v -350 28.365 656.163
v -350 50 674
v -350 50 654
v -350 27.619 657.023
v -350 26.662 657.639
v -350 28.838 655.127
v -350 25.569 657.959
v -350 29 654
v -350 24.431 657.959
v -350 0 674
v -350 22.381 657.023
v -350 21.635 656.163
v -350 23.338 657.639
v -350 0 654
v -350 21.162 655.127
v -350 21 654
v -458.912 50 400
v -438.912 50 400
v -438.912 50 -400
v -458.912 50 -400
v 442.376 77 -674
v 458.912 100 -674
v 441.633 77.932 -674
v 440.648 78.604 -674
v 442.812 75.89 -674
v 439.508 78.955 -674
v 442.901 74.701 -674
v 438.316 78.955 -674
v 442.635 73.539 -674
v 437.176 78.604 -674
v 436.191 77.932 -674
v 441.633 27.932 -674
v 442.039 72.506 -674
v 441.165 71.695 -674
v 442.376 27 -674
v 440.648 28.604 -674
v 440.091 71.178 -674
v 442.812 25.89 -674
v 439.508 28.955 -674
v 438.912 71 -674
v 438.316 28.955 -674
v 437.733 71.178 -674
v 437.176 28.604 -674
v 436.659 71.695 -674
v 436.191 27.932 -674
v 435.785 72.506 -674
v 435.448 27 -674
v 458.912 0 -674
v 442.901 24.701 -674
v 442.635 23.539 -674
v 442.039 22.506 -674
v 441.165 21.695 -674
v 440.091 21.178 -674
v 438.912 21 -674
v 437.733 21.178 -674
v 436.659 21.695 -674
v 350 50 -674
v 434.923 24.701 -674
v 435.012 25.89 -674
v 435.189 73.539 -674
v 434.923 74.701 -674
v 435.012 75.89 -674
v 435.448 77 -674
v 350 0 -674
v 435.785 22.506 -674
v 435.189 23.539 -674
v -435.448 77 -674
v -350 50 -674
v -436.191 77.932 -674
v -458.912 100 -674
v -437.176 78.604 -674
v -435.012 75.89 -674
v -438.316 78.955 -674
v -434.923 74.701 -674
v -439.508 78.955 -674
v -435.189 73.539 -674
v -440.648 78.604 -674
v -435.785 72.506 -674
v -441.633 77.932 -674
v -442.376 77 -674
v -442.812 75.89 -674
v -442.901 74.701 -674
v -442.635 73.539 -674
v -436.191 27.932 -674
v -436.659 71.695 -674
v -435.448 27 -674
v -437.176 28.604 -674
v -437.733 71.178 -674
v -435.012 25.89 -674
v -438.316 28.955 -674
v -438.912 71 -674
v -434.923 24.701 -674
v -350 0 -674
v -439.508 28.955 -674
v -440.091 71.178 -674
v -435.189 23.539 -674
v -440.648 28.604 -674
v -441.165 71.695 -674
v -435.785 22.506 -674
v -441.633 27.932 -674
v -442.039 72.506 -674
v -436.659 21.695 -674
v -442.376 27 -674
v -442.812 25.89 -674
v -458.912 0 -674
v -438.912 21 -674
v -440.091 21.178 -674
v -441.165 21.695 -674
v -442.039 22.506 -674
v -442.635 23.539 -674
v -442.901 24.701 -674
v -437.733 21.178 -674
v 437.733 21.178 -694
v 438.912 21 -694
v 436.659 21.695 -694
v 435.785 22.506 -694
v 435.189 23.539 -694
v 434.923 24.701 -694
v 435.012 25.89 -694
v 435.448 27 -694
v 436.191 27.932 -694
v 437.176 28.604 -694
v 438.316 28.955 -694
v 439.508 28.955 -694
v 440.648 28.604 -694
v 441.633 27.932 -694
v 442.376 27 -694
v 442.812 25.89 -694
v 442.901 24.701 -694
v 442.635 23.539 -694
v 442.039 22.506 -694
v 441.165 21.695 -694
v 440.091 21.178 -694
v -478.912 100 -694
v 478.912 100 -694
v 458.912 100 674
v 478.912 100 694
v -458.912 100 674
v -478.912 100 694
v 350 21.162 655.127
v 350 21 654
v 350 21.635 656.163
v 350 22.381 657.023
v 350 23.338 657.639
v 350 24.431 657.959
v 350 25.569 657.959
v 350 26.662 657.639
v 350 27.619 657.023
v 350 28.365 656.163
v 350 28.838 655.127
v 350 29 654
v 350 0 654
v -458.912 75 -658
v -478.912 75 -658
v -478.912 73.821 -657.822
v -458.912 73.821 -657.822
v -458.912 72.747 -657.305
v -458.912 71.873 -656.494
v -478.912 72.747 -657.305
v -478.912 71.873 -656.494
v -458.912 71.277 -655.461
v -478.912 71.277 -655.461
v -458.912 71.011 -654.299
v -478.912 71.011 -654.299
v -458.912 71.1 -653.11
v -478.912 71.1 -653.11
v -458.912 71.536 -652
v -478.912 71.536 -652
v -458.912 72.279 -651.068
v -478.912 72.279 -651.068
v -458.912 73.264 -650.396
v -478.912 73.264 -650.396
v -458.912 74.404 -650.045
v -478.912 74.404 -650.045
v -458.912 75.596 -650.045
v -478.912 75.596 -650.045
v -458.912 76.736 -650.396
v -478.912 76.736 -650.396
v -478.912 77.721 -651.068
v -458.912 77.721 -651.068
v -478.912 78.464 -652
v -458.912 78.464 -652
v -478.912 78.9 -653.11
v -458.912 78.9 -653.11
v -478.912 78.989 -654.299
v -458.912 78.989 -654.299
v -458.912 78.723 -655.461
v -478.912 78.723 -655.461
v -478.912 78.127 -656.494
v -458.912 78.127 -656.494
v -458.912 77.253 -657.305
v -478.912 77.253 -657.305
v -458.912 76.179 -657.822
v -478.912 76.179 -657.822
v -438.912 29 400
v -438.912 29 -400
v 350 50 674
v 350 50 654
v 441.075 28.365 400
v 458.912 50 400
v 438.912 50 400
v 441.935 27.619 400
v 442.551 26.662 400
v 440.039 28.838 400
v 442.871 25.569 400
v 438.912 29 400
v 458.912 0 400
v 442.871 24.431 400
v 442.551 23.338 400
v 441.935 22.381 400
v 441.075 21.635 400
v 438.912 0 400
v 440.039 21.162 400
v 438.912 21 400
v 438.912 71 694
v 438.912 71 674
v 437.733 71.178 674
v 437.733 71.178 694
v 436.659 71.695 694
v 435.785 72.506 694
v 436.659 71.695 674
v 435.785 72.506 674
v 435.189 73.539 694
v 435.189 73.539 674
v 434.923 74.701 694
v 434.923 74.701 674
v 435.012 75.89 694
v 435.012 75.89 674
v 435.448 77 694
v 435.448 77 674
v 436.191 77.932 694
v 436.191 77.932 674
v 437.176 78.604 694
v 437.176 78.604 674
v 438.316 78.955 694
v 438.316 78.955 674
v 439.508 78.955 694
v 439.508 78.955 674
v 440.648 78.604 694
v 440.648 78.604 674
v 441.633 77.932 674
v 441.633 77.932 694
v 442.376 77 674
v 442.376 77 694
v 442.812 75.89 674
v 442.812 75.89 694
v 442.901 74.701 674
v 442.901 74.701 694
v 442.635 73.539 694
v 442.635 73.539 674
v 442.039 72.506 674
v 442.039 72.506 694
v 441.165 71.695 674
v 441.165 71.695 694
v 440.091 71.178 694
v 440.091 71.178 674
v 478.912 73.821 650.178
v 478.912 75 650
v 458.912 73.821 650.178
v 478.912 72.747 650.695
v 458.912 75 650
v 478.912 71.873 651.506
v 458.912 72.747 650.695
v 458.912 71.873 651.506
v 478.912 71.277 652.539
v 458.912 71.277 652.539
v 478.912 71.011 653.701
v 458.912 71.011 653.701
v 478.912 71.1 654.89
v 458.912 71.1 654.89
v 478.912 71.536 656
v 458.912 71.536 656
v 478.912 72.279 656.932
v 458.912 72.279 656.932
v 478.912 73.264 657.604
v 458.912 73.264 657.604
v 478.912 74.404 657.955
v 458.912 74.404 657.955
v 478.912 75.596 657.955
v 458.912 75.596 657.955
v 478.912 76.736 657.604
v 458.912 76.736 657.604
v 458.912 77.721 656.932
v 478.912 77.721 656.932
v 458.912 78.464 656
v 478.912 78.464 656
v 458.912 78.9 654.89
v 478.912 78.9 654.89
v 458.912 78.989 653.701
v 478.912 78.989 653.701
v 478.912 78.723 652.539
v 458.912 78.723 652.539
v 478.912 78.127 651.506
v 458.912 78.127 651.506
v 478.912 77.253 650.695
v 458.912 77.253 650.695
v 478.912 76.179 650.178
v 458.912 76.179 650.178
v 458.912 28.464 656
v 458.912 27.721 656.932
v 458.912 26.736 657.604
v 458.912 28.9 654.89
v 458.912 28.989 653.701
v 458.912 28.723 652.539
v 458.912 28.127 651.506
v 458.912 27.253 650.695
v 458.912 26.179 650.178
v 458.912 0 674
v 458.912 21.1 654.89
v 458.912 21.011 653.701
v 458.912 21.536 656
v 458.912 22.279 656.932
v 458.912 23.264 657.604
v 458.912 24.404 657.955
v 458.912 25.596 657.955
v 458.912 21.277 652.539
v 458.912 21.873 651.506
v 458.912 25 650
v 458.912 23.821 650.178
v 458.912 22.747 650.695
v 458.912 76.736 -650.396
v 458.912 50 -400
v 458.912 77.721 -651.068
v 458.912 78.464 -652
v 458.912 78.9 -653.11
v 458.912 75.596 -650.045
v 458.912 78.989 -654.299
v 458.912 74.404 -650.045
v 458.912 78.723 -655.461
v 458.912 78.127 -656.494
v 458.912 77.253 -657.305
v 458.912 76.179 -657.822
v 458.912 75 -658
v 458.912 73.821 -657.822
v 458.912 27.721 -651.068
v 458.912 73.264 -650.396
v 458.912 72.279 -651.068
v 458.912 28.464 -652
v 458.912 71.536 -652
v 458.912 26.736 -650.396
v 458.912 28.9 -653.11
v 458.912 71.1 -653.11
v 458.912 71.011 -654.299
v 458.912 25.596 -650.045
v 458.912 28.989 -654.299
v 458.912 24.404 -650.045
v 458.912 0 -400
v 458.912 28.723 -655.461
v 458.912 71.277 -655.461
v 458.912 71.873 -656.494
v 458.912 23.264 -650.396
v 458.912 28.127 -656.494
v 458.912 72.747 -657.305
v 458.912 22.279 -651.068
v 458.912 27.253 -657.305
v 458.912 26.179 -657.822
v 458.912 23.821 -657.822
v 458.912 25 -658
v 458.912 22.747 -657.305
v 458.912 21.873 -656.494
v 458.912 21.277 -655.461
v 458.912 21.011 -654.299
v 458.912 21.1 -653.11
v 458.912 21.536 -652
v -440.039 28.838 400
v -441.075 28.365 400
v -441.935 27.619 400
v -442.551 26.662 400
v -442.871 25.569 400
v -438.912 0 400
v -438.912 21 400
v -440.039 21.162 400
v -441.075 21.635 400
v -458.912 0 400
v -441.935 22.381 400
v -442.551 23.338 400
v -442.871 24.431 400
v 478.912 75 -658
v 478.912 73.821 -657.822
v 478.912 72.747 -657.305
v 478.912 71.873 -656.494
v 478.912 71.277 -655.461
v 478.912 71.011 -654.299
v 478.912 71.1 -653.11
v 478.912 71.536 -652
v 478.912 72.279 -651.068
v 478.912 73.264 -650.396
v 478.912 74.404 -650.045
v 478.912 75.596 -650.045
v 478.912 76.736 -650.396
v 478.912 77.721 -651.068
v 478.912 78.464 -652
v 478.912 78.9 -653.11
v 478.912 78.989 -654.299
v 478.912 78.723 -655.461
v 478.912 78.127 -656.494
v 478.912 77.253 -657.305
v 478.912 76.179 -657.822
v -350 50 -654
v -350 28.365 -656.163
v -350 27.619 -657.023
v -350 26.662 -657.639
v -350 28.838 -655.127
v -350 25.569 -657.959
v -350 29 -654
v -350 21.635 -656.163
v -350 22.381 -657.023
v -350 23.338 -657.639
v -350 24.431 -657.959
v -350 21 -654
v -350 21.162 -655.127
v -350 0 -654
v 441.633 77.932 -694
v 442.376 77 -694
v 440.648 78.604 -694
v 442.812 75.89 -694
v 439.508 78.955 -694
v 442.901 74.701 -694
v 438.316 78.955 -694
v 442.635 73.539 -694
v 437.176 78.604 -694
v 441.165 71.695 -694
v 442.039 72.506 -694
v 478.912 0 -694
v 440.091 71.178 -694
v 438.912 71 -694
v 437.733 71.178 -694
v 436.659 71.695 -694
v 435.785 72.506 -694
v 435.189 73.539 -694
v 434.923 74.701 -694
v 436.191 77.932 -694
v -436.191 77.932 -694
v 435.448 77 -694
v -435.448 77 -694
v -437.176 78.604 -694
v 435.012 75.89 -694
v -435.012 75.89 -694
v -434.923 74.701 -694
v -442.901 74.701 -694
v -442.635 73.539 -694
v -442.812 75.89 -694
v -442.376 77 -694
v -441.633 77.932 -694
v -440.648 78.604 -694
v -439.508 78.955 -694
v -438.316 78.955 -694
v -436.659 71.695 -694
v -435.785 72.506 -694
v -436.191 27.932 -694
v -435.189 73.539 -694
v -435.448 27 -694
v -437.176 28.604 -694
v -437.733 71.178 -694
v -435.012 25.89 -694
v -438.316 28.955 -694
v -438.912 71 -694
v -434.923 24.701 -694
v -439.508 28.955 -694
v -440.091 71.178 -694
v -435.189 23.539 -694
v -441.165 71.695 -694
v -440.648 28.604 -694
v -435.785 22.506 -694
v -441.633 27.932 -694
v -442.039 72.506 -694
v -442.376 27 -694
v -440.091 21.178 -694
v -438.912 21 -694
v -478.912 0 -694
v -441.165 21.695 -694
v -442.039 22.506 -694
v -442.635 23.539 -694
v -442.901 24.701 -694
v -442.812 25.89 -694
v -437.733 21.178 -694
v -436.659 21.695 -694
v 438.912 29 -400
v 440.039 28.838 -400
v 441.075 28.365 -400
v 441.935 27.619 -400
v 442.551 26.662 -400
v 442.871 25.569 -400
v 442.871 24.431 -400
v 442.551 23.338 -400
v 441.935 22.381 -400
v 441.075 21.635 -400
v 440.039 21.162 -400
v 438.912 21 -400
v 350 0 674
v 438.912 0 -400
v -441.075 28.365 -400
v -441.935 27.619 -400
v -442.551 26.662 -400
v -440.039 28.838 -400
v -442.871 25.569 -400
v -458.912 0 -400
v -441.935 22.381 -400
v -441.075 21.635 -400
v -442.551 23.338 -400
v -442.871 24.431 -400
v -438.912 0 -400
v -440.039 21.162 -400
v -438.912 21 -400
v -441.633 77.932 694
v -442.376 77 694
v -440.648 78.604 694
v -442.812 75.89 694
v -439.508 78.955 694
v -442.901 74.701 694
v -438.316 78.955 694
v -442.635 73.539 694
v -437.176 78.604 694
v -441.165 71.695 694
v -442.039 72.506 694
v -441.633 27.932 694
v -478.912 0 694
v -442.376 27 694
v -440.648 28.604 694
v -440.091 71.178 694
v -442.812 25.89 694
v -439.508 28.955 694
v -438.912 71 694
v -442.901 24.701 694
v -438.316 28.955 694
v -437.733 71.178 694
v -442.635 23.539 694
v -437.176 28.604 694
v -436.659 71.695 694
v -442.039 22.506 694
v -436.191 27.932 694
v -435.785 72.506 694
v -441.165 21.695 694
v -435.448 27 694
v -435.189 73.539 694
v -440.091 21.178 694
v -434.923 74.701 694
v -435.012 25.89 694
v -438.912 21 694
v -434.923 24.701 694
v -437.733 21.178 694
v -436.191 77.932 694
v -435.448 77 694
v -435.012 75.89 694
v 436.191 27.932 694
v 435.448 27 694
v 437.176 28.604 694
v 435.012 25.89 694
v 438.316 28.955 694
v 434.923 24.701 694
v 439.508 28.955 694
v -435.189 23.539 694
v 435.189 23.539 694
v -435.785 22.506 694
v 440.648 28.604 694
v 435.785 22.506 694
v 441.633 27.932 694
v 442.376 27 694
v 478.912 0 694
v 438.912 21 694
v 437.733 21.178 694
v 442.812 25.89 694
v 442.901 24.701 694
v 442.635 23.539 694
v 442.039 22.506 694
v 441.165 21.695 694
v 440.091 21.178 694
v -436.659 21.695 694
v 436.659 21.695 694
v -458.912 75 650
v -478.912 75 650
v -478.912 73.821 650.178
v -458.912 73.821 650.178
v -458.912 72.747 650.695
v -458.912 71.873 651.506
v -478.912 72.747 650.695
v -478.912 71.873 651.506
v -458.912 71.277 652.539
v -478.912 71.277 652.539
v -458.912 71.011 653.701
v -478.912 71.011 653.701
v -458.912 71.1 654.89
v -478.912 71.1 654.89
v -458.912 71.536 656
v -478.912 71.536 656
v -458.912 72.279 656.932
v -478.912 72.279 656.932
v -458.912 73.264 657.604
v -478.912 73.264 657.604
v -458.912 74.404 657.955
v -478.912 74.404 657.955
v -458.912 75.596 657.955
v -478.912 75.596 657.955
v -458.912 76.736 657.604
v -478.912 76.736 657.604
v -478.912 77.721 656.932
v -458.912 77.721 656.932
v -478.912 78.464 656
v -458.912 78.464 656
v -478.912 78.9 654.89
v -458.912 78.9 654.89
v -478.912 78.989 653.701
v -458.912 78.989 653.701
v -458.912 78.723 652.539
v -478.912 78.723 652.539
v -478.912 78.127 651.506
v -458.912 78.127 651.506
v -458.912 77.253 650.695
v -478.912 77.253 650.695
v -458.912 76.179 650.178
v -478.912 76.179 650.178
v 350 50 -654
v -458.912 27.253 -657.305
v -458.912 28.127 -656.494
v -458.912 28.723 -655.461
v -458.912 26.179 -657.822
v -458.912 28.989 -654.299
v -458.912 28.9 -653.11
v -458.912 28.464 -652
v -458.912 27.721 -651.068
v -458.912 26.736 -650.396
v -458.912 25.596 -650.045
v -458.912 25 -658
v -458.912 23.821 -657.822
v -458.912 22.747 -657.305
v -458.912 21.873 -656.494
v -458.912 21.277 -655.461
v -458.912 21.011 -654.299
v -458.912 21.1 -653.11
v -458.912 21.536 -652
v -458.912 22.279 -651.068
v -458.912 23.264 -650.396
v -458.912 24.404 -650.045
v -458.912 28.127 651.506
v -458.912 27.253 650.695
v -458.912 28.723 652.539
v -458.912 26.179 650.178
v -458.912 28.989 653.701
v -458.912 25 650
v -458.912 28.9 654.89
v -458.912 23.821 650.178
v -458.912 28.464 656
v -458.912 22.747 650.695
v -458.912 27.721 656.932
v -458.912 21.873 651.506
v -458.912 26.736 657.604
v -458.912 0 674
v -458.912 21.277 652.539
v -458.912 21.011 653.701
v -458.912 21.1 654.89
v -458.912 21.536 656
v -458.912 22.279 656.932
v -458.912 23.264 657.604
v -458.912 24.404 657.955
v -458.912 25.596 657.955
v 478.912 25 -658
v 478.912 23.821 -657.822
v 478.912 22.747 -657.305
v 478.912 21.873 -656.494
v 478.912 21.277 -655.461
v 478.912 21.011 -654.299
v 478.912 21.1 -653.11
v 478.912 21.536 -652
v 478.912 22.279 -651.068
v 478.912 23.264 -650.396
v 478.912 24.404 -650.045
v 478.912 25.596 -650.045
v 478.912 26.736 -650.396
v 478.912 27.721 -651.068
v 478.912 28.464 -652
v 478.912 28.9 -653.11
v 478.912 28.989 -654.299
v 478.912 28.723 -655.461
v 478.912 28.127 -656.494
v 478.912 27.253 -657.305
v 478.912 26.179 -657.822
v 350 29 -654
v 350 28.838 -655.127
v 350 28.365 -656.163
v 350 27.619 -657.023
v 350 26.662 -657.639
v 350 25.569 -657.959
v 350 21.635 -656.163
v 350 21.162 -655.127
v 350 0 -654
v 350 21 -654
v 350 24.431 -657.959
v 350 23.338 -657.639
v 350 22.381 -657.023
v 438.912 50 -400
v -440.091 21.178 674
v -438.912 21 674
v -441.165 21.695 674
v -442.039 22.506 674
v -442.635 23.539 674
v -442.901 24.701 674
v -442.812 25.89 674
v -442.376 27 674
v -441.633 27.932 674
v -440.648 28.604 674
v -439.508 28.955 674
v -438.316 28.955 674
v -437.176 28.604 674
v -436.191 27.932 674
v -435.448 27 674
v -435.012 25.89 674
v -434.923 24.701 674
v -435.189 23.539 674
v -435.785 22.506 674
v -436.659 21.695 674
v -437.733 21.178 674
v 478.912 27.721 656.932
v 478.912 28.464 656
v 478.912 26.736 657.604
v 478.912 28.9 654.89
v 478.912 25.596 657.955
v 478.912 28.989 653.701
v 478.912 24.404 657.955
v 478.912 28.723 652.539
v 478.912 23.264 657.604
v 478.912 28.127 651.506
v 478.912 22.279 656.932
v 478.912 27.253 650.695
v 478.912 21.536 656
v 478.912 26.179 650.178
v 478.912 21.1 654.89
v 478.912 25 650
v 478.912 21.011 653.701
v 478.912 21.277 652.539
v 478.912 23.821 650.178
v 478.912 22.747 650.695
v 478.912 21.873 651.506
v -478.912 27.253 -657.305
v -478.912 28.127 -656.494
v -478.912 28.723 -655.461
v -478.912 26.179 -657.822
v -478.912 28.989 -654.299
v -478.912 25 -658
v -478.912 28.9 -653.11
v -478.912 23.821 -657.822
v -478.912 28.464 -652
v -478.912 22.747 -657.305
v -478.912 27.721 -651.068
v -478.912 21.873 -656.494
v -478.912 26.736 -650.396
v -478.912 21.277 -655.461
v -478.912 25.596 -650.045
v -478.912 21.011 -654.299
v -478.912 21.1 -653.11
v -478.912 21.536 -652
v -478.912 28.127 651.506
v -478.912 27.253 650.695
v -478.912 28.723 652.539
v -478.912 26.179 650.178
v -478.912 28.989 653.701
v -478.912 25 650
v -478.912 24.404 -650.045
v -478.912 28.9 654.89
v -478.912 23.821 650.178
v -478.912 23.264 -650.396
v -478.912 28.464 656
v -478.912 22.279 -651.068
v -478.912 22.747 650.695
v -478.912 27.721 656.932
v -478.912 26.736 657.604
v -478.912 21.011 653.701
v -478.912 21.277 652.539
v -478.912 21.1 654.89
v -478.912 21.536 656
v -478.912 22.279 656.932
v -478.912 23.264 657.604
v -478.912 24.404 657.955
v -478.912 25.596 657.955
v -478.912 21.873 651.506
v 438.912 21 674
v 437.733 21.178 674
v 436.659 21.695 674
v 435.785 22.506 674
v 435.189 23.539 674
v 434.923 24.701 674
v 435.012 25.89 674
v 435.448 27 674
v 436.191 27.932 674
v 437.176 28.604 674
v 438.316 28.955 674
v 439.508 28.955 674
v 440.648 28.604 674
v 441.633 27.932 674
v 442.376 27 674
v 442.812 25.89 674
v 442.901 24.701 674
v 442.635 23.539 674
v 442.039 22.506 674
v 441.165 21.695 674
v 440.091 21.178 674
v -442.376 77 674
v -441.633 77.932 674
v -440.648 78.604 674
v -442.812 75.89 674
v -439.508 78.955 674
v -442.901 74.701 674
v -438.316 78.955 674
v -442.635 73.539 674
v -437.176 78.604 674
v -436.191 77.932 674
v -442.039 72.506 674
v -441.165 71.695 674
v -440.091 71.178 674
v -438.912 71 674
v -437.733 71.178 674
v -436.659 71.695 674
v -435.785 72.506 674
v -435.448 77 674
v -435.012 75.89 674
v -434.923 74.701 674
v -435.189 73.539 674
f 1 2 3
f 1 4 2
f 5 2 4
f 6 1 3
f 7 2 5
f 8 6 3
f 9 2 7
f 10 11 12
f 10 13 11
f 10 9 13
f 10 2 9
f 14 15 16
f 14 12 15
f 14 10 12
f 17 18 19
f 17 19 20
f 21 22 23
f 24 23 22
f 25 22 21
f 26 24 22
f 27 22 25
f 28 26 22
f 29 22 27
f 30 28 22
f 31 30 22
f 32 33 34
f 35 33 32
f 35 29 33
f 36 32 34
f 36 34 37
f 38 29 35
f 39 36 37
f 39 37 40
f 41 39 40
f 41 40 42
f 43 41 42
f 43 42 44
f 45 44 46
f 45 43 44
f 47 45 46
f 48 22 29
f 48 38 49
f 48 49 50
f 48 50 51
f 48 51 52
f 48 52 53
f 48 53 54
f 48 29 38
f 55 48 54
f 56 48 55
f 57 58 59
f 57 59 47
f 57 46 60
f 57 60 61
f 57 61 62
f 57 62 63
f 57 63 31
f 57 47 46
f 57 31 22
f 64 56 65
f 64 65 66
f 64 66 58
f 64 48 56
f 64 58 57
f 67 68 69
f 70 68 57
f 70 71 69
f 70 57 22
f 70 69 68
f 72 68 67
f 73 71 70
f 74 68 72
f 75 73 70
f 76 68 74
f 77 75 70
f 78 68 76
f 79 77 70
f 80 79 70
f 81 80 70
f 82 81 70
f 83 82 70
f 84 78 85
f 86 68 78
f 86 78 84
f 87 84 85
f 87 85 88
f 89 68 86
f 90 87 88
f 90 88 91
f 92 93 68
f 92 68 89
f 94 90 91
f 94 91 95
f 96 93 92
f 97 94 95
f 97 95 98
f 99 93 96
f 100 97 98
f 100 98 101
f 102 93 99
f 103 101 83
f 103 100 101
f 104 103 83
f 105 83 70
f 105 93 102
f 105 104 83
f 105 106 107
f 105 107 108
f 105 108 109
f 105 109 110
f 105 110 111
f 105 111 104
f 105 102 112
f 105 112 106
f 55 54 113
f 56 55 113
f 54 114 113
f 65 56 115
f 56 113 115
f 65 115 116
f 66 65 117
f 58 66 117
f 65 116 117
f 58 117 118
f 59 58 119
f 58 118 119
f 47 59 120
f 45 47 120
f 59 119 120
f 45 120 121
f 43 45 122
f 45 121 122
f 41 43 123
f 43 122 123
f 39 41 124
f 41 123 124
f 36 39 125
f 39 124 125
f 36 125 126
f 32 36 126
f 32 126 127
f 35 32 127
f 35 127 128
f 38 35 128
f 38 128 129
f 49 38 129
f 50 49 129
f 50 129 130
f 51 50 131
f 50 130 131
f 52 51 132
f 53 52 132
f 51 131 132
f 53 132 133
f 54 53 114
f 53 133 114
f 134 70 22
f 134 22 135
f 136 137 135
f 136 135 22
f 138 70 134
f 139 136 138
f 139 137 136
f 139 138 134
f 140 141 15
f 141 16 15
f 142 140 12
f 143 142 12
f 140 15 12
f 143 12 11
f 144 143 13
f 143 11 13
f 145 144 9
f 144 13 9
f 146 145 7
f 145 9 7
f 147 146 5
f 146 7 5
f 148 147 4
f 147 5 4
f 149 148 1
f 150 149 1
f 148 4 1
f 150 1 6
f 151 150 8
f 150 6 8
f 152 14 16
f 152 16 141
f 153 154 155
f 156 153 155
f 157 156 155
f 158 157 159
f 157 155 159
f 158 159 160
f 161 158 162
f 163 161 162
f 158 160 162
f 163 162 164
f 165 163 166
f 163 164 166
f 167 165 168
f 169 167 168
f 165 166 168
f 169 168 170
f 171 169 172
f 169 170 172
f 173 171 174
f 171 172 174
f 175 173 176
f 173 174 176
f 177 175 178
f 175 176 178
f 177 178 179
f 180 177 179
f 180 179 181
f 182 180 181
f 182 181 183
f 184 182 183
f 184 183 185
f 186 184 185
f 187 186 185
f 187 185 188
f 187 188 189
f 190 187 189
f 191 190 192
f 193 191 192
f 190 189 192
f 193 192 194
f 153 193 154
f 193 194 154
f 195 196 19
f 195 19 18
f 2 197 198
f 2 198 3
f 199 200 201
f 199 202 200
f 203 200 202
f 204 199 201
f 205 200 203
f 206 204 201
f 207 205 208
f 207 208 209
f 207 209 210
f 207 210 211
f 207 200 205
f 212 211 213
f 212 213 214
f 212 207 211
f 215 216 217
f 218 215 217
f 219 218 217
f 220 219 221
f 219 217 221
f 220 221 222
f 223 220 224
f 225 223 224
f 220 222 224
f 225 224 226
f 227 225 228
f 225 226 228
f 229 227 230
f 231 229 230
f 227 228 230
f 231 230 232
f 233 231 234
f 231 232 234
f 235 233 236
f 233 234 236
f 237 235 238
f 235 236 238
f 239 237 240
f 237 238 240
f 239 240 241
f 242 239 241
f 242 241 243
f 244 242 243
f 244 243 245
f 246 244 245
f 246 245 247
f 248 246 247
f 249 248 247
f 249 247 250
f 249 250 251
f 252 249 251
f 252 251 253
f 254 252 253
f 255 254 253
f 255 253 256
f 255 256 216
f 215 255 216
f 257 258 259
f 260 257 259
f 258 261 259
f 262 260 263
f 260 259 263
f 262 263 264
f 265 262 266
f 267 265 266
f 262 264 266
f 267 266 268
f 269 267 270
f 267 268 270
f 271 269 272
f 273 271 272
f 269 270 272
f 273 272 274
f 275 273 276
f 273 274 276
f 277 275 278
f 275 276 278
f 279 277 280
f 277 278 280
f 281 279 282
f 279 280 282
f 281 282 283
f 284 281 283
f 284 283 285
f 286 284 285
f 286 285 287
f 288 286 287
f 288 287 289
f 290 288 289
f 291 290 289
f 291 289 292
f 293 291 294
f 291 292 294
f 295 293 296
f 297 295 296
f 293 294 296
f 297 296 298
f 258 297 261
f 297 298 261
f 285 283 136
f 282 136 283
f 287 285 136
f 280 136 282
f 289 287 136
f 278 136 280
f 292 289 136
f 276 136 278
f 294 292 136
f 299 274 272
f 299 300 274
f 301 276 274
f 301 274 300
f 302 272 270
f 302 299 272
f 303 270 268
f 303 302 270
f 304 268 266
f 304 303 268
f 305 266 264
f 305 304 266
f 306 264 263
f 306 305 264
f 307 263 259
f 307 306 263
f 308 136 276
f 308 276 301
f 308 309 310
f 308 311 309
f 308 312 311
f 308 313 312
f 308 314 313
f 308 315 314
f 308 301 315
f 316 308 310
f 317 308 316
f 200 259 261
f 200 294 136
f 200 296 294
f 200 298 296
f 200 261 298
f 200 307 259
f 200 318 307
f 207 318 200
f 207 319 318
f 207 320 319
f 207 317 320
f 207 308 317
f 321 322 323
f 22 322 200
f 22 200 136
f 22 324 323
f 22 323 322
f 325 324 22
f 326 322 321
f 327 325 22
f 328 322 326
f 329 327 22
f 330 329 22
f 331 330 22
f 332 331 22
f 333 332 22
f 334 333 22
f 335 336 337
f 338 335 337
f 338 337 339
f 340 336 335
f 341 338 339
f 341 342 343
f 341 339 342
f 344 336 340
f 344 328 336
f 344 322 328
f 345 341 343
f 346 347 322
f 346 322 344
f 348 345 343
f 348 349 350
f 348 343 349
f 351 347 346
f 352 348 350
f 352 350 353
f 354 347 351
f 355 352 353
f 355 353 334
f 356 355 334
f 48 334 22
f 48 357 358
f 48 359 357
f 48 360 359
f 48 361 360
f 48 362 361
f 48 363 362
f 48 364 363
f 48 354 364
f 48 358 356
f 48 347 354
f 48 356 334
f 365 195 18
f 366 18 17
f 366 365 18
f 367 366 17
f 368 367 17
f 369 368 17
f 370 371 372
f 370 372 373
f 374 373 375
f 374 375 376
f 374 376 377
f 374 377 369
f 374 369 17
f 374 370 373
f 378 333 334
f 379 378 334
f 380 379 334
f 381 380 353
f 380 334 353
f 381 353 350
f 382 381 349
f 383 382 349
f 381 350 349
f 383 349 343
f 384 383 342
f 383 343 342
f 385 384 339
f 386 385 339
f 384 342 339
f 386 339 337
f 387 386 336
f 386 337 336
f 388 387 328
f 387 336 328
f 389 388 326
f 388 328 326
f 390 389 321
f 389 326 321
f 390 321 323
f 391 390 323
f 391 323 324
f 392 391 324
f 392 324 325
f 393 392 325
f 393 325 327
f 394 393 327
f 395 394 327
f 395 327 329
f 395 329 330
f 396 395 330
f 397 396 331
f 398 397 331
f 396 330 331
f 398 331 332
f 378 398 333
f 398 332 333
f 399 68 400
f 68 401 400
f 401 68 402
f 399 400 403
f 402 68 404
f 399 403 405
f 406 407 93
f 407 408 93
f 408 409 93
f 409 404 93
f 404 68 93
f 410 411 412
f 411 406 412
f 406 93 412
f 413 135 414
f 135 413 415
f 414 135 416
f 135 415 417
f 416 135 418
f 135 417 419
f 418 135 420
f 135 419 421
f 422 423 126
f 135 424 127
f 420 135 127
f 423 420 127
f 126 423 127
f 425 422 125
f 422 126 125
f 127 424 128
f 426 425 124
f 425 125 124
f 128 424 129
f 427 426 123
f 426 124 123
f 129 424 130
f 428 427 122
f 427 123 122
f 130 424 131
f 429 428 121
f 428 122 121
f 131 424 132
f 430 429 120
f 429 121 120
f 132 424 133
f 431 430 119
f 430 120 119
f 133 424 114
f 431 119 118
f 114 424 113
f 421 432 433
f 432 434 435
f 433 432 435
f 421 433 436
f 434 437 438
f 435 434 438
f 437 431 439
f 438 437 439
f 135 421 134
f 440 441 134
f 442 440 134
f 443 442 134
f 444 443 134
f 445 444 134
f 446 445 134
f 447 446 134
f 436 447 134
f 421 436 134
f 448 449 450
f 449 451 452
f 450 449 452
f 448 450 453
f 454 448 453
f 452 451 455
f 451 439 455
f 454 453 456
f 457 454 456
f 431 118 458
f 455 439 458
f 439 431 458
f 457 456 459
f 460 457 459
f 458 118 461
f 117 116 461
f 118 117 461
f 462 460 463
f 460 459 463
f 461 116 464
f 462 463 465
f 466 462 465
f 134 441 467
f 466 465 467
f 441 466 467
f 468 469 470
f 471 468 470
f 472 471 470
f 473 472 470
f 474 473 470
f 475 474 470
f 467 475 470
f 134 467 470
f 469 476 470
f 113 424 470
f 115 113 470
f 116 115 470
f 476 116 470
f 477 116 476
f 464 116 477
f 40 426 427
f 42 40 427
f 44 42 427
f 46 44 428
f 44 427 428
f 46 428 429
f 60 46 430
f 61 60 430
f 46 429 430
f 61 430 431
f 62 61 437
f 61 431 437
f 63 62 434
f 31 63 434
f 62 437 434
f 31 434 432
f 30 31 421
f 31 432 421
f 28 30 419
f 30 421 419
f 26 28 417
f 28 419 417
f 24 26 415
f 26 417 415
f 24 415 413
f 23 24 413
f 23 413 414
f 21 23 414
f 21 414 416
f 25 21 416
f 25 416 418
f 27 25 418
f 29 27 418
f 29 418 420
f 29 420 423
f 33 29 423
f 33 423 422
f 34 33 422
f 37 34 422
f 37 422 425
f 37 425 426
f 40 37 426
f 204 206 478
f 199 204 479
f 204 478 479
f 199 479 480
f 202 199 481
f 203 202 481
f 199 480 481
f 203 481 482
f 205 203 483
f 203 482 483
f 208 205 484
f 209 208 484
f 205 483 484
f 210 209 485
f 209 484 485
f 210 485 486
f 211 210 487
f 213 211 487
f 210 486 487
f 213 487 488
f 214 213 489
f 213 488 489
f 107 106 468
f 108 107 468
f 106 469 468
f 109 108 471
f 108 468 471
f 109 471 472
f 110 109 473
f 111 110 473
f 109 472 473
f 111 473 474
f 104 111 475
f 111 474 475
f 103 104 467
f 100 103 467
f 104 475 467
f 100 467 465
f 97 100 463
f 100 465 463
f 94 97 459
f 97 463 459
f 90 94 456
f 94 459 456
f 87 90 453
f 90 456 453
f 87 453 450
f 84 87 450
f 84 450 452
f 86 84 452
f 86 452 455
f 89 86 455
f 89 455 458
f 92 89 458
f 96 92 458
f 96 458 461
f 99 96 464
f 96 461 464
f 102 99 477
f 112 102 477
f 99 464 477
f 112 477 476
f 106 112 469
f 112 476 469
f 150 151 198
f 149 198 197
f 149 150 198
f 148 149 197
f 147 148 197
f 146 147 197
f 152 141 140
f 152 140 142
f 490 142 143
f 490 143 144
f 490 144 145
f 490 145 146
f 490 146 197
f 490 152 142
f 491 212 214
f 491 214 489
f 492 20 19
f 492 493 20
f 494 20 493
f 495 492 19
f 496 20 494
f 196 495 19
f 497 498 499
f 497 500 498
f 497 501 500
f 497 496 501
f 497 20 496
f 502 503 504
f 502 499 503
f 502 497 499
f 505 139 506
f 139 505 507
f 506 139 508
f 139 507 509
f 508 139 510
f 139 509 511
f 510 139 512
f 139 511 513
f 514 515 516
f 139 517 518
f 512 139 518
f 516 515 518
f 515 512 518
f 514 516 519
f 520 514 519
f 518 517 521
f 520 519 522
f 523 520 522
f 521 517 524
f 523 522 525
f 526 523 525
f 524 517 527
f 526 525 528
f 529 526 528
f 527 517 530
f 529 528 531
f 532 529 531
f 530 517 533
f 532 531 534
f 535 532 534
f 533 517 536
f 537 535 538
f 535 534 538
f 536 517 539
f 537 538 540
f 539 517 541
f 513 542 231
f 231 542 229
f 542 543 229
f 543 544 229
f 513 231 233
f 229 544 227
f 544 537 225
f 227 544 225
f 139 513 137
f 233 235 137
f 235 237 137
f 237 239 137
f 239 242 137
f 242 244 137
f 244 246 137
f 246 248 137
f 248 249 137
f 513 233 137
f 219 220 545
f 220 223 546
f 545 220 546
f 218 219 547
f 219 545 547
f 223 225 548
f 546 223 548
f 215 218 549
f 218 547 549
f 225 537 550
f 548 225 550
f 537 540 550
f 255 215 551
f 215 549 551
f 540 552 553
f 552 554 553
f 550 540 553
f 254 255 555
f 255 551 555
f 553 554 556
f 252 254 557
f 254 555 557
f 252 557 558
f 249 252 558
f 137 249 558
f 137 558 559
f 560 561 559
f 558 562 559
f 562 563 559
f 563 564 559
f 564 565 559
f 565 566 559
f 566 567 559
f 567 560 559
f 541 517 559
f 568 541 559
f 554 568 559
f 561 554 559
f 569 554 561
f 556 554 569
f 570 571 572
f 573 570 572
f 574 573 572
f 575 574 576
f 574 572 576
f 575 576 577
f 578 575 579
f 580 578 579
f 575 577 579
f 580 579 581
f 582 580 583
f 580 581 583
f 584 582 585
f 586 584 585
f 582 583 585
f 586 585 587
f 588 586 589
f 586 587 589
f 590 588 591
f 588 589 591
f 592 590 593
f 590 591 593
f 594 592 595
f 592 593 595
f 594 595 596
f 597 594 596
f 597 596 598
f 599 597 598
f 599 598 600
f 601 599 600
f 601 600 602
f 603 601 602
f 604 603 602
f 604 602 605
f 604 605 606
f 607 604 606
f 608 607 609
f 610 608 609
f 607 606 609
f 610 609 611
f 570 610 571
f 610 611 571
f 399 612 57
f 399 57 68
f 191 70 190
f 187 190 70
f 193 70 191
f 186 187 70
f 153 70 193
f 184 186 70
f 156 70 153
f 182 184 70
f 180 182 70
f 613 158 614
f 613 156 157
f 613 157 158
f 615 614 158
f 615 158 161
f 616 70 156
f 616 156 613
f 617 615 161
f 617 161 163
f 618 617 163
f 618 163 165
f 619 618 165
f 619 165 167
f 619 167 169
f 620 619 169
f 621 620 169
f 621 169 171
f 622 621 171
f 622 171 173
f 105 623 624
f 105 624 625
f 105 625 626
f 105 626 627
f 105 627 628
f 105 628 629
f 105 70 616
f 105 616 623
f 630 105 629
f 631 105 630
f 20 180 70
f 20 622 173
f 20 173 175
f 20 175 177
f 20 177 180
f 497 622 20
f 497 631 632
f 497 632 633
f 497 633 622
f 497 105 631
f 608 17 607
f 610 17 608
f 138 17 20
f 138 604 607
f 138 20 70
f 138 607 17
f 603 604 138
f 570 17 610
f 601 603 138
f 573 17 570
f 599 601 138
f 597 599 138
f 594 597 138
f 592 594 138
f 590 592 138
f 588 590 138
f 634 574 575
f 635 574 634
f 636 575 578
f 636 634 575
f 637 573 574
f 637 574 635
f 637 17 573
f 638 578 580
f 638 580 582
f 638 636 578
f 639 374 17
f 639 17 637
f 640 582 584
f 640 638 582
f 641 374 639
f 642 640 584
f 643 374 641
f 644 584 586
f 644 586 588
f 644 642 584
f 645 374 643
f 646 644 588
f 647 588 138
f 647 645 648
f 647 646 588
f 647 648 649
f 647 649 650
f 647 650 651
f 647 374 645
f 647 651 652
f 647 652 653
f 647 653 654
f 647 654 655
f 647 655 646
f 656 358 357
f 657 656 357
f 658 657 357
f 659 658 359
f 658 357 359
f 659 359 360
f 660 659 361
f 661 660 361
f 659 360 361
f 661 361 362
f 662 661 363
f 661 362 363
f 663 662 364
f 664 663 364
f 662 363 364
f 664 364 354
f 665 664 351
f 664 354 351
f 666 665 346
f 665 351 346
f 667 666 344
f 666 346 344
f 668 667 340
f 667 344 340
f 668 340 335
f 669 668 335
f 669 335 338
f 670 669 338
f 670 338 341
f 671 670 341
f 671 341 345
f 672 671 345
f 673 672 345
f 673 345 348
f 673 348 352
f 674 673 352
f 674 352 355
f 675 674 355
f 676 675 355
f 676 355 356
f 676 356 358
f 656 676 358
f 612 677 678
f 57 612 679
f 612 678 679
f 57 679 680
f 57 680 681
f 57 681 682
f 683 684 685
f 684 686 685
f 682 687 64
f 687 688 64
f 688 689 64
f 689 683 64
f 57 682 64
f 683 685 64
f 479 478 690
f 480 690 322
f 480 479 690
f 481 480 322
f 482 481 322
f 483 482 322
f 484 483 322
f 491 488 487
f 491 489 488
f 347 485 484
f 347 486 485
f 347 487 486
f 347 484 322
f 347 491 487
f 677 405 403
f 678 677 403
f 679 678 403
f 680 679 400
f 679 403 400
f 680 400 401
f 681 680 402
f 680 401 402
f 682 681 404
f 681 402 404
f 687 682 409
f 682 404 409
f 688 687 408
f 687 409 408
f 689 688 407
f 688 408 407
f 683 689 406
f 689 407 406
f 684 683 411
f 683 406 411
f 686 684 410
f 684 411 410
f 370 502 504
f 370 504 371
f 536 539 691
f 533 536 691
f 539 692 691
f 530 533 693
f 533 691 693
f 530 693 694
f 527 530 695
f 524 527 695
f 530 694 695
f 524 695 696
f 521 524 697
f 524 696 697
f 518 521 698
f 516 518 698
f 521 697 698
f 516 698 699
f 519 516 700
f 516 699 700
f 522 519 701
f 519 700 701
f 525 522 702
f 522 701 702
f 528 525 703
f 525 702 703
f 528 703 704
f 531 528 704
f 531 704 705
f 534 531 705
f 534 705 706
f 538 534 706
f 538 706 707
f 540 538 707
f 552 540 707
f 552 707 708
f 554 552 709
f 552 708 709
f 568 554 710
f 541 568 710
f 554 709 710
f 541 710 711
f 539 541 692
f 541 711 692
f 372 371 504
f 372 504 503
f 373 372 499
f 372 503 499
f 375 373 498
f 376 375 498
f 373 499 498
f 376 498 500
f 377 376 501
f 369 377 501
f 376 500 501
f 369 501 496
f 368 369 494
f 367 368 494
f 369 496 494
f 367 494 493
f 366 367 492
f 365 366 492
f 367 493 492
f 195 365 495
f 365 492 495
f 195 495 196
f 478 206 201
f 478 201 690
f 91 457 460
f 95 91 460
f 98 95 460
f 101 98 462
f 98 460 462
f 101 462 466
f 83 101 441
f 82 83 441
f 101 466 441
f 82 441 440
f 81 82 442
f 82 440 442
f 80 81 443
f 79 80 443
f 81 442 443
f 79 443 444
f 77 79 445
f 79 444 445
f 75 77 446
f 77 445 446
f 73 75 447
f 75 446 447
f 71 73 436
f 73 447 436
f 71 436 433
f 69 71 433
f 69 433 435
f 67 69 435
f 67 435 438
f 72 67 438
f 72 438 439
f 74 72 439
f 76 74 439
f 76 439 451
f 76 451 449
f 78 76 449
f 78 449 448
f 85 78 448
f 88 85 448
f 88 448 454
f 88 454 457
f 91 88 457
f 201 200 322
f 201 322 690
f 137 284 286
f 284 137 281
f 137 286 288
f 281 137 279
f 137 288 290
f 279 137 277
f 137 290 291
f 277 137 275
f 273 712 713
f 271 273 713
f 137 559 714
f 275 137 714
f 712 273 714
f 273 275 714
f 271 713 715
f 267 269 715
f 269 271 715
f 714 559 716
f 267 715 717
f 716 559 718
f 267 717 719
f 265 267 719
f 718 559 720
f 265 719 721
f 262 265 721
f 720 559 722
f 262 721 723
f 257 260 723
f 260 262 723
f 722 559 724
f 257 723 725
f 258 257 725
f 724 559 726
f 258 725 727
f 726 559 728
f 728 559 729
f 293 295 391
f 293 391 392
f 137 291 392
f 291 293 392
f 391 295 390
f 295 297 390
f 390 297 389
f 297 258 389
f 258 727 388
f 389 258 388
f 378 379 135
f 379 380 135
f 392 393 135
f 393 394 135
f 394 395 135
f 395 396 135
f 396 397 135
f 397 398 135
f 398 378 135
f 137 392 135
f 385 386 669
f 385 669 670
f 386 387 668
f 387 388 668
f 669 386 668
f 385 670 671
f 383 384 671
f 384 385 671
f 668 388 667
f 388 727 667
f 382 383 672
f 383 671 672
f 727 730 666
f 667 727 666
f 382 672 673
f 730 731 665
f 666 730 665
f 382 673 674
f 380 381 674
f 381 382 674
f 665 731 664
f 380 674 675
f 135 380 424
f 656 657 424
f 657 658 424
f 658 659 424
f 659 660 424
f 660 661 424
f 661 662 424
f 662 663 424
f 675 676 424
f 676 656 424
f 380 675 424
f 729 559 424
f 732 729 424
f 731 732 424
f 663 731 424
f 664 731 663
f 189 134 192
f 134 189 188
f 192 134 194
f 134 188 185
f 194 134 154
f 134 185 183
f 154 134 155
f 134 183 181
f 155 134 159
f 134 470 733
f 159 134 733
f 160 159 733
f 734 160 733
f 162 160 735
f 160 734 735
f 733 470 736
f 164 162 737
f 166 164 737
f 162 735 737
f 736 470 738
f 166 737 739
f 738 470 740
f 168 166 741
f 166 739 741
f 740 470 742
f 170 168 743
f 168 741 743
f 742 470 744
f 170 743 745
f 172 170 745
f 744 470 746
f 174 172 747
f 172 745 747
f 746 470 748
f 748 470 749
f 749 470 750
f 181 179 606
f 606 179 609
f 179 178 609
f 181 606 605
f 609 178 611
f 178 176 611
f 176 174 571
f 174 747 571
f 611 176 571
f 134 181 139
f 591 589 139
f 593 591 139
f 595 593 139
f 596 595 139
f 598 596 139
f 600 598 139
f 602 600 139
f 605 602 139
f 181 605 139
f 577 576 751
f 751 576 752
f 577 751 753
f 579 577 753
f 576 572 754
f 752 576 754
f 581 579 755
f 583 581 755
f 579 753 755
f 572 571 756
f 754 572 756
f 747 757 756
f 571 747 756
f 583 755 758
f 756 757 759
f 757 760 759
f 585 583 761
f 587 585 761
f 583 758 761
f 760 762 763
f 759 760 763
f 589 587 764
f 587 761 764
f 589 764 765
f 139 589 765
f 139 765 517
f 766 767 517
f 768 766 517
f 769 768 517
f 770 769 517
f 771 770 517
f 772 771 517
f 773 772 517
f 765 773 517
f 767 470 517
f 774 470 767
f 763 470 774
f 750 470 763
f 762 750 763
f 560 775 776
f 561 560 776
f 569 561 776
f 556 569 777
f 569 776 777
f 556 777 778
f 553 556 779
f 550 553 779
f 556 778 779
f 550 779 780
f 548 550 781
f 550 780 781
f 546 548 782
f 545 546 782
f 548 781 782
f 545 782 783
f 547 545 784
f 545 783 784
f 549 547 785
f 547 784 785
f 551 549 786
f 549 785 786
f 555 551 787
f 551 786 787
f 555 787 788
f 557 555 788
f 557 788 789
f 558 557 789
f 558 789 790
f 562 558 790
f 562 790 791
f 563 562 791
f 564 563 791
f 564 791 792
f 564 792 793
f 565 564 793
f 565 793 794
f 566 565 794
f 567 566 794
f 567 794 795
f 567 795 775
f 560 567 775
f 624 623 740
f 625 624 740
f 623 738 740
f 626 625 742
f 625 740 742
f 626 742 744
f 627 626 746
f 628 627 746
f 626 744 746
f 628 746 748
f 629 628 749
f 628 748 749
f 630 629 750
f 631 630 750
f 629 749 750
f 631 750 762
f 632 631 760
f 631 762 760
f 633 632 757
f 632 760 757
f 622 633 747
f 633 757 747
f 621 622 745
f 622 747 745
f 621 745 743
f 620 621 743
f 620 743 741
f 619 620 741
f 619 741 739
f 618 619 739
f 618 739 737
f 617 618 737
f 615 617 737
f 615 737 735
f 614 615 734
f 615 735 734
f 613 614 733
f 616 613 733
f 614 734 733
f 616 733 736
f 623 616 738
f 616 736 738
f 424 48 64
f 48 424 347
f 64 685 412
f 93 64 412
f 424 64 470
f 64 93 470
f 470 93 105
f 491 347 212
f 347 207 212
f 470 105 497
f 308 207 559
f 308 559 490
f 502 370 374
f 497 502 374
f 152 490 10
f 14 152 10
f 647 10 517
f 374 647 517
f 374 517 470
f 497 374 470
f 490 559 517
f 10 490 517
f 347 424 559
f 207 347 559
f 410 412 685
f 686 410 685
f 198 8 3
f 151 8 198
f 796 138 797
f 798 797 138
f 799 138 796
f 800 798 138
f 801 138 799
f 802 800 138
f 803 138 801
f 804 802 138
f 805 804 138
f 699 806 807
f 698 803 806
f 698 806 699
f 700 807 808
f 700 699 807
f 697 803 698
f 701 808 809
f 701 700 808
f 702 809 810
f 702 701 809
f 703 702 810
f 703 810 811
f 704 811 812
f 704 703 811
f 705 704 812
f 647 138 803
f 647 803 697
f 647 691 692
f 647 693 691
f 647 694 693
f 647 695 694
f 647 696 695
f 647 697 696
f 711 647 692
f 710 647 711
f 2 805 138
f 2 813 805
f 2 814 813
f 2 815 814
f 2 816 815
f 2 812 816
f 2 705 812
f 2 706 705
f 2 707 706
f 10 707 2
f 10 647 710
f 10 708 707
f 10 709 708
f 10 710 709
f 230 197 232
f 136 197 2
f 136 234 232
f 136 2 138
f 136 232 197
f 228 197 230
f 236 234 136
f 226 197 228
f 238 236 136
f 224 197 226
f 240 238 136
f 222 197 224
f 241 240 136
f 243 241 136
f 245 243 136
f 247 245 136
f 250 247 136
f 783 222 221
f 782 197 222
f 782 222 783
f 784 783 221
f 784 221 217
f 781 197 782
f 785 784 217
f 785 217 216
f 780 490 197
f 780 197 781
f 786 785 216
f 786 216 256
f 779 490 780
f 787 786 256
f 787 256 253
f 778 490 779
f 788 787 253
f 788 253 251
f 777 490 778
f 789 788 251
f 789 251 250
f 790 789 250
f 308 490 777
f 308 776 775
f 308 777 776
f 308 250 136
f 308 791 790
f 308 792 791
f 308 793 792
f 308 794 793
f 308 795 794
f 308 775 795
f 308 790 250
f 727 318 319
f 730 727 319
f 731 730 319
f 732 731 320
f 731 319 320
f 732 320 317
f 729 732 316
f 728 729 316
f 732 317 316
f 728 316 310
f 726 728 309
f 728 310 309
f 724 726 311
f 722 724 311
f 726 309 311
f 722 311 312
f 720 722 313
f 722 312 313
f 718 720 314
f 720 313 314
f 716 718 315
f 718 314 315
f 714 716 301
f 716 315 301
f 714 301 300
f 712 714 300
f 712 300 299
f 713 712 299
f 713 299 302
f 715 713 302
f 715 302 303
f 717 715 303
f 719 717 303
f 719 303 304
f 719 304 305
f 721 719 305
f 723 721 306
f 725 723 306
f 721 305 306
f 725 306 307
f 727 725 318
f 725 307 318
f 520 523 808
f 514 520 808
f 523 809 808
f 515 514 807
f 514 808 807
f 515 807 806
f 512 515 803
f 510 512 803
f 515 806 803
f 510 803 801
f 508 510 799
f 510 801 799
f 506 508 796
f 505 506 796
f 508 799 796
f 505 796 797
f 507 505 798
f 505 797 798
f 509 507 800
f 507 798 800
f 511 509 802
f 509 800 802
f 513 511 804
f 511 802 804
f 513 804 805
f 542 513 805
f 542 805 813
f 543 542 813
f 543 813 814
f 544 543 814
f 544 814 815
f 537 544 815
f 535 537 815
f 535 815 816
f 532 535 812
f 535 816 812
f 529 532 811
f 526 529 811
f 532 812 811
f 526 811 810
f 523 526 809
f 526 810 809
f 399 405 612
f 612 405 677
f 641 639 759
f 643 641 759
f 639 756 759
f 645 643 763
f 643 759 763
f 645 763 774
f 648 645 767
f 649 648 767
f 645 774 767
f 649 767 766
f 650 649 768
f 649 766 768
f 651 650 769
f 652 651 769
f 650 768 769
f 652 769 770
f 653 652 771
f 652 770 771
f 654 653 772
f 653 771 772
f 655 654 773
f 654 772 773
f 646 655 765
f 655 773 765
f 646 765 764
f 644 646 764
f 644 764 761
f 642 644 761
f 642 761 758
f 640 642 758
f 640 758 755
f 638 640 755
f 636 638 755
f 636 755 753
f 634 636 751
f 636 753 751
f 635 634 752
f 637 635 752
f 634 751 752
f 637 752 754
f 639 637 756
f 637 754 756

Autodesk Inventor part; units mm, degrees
ref_plane "YZ Plane" through (0, 0, 0) normal (1, 0, 0) x (0, 1, 0)
ref_plane "XZ Plane" through (0, 0, 0) normal (0, 1, 0) x (-1, 0, 0)
ref_plane "XY Plane" through (0, 0, 0) normal (0, 0, 1) x (1, 0, 0)
sketch "Sketch1" plane through (0, 0, 0) normal (0, 1, 0) x (-1, 0, 0)
  line L0 (478.912, 694) -> (-478.912, 694)
  line L1 (-478.912, 694) -> (-478.912, -694)
  line L2 (-478.912, -694) -> (478.912, -694)
  line L3 (478.912, -694) -> (478.912, 694)
  line L4 (478.912, 694) -> (-478.912, -694) construction
  line L5 (-478.912, 694) -> (478.912, -694) construction
  line L6 (458.912, 674) -> (-458.912, 674)
  line L7 (-458.912, 674) -> (-458.912, -674)
  line L8 (-458.912, -674) -> (458.912, -674)
  line L9 (458.912, -674) -> (458.912, 674)
  line L10 (458.912, 674) -> (-458.912, -674) construction
  line L11 (-458.912, 674) -> (458.912, -674) construction
  line L12 (438.912, 400) -> (458.912, 400)
  line L13 (458.912, 400) -> (458.912, -400)
  line L14 (458.912, -400) -> (438.912, -400)
  line L15 (438.912, -400) -> (438.912, 400)
  line L16 (438.912, 400) -> (458.912, -400) construction
  line L17 (458.912, 400) -> (438.912, -400) construction
  line L18 (-458.912, 400) -> (-438.912, 400)
  line L19 (-438.912, 400) -> (-438.912, -400)
  line L20 (-438.912, -400) -> (-458.912, -400)
  line L21 (-458.912, -400) -> (-458.912, 400)
  line L22 (-458.912, 400) -> (-438.912, -400) construction
  line L23 (-438.912, 400) -> (-458.912, -400) construction
  line L24 (-350, 674) -> (350, 674)
  line L25 (350, 674) -> (350, 654)
  line L26 (350, 654) -> (-350, 654)
  line L27 (-350, 654) -> (-350, 674)
  line L28 (-350, 674) -> (350, 654) construction
  line L29 (350, 674) -> (-350, 654) construction
  line L30 (350, -654) -> (-350, -654)
  line L31 (-350, -654) -> (-350, -674)
  line L32 (-350, -674) -> (350, -674)
  line L33 (350, -674) -> (350, -654)
  line L34 (350, -654) -> (-350, -674) construction
  line L35 (-350, -654) -> (350, -674) construction
  point P0 (0, 0)
  point P1 (448.912, 0)
  point P2 (458.912, 0)
  point P3 (-448.912, 0)
  point P4 (-458.912, 0)
  point P5 (0, 664)
  point P6 (0, -664)
  point P7 (0, 674)
  point P8 (0, -674)
  dimension "d0" = 957.824
  dimension "d1" = 1388
  dimension "d2" = 917.824
  dimension "d3" = 1348
  dimension "d4" = 20
  dimension "d5" = 800
  dimension "d6" = 20
  dimension "d7" = 800
  dimension "d8" = 700
  dimension "d9" = 20
  dimension "d10" = 700
  dimension "d11" = 20
extrude "Extrusion6" add sketch "Sketch1" along normal blind 50 contours L25 L26 L27 L6 | L9 L14 L15 L12 | L18 L19 L20 L7 | L8 L31 L30 L33
extrude "Extrusion7" add sketch "Sketch1" along normal blind 100
sketch "Sketch2" plane through (478.912, 0, 694) normal (1, 0, 0) x (0, 0, -1)
  line L0 (0, 0) -> (0, 100) projected
  line L1 (0, 100) -> (1388, 100) projected
  point P0 (694, 0)
  point P1 (40, 75)
  dimension "d40" = 40
  dimension "d41" = 25
hole "Hole1" at (478.912, 75, 654) direction (-1, 0, 0) diameter 8 end through all
sketch "Sketch3" plane through (478.912, 0, 694) normal (1, 0, 0) x (0, 0, -1)
  line L0 (0, 0) -> (0, 100) projected
  line L1 (0, 0) -> (1388, 0) projected
  point P0 (694, 0)
  point P1 (40, 25)
  dimension "d42" = 40
  dimension "d43" = 25
hole "Hole2" at (478.912, 25, 654) direction (-1, 0, 0) diameter 8 end through all
sketch "Sketch4" plane through (478.912, 0, 694) normal (1, 0, 0) x (0, 0, -1)
  line L0 (1388, 0) -> (1388, 100) projected
  line L1 (0, 100) -> (1388, 100) projected
  point P0 (694, 0)
  point P1 (1348, 75)
  dimension "d58" = 40
  dimension "d59" = 25
hole "Hole3" at (478.912, 75, -654) direction (-1, 0, 0) diameter 8 end through all
sketch "Sketch5" plane through (478.912, 0, 694) normal (1, 0, 0) x (0, 0, -1)
  line L0 (1388, 0) -> (1388, 100) projected
  line L1 (0, 0) -> (1388, 0) projected
  point P0 (694, 0)
  point P1 (1348, 25)
  dimension "d60" = 40
  dimension "d61" = 25
hole "Hole4" at (478.912, 25, -654) direction (-1, 0, 0) diameter 8 end through all
sketch "Sketch6" plane through (-478.912, 0, 694) normal (0, 0, 1) x (1, 0, 0)
  line L0 (0, 100) -> (957.824, 100) projected
  line L1 (957.824, 0) -> (957.824, 100) projected
  line L2 (0, 0) -> (957.824, 0) projected
  point P0 (478.912, 0)
  point P1 (917.824, 75)
  point P2 (917.824, 25)
  dimension "d69" = 25
  dimension "d70" = 40
  dimension "d71" = 40
  dimension "d72" = 25
hole "Hole5" at (438.912, 75, 694) at (438.912, 25, 694) direction (0, 0, -1) diameter 8 end through all
sketch "Sketch7" plane through (-478.912, 0, 694) normal (0, 0, 1) x (1, 0, 0)
  line L0 (0, 0) -> (0, 100) projected
  line L1 (0, 100) -> (957.824, 100) projected
  point P0 (478.912, 0)
  point P1 (40, 75)
  dimension "d87" = 40
  dimension "d88" = 25
hole "Hole6" at (-438.912, 75, 694) direction (0, 0, -1) diameter 8 end through all
sketch "Sketch8" plane through (-478.912, 0, 694) normal (0, 0, 1) x (1, 0, 0)
  line L0 (0, 0) -> (0, 100) projected
  line L1 (0, 0) -> (957.824, 0) projected
  point P0 (478.912, 0)
  point P1 (40, 25)
  dimension "d89" = 40
  dimension "d90" = 25
hole "Hole7" at (-438.912, 25, 694) direction (0, 0, -1) diameter 8 end through all
properties part number "tub floor 1"
